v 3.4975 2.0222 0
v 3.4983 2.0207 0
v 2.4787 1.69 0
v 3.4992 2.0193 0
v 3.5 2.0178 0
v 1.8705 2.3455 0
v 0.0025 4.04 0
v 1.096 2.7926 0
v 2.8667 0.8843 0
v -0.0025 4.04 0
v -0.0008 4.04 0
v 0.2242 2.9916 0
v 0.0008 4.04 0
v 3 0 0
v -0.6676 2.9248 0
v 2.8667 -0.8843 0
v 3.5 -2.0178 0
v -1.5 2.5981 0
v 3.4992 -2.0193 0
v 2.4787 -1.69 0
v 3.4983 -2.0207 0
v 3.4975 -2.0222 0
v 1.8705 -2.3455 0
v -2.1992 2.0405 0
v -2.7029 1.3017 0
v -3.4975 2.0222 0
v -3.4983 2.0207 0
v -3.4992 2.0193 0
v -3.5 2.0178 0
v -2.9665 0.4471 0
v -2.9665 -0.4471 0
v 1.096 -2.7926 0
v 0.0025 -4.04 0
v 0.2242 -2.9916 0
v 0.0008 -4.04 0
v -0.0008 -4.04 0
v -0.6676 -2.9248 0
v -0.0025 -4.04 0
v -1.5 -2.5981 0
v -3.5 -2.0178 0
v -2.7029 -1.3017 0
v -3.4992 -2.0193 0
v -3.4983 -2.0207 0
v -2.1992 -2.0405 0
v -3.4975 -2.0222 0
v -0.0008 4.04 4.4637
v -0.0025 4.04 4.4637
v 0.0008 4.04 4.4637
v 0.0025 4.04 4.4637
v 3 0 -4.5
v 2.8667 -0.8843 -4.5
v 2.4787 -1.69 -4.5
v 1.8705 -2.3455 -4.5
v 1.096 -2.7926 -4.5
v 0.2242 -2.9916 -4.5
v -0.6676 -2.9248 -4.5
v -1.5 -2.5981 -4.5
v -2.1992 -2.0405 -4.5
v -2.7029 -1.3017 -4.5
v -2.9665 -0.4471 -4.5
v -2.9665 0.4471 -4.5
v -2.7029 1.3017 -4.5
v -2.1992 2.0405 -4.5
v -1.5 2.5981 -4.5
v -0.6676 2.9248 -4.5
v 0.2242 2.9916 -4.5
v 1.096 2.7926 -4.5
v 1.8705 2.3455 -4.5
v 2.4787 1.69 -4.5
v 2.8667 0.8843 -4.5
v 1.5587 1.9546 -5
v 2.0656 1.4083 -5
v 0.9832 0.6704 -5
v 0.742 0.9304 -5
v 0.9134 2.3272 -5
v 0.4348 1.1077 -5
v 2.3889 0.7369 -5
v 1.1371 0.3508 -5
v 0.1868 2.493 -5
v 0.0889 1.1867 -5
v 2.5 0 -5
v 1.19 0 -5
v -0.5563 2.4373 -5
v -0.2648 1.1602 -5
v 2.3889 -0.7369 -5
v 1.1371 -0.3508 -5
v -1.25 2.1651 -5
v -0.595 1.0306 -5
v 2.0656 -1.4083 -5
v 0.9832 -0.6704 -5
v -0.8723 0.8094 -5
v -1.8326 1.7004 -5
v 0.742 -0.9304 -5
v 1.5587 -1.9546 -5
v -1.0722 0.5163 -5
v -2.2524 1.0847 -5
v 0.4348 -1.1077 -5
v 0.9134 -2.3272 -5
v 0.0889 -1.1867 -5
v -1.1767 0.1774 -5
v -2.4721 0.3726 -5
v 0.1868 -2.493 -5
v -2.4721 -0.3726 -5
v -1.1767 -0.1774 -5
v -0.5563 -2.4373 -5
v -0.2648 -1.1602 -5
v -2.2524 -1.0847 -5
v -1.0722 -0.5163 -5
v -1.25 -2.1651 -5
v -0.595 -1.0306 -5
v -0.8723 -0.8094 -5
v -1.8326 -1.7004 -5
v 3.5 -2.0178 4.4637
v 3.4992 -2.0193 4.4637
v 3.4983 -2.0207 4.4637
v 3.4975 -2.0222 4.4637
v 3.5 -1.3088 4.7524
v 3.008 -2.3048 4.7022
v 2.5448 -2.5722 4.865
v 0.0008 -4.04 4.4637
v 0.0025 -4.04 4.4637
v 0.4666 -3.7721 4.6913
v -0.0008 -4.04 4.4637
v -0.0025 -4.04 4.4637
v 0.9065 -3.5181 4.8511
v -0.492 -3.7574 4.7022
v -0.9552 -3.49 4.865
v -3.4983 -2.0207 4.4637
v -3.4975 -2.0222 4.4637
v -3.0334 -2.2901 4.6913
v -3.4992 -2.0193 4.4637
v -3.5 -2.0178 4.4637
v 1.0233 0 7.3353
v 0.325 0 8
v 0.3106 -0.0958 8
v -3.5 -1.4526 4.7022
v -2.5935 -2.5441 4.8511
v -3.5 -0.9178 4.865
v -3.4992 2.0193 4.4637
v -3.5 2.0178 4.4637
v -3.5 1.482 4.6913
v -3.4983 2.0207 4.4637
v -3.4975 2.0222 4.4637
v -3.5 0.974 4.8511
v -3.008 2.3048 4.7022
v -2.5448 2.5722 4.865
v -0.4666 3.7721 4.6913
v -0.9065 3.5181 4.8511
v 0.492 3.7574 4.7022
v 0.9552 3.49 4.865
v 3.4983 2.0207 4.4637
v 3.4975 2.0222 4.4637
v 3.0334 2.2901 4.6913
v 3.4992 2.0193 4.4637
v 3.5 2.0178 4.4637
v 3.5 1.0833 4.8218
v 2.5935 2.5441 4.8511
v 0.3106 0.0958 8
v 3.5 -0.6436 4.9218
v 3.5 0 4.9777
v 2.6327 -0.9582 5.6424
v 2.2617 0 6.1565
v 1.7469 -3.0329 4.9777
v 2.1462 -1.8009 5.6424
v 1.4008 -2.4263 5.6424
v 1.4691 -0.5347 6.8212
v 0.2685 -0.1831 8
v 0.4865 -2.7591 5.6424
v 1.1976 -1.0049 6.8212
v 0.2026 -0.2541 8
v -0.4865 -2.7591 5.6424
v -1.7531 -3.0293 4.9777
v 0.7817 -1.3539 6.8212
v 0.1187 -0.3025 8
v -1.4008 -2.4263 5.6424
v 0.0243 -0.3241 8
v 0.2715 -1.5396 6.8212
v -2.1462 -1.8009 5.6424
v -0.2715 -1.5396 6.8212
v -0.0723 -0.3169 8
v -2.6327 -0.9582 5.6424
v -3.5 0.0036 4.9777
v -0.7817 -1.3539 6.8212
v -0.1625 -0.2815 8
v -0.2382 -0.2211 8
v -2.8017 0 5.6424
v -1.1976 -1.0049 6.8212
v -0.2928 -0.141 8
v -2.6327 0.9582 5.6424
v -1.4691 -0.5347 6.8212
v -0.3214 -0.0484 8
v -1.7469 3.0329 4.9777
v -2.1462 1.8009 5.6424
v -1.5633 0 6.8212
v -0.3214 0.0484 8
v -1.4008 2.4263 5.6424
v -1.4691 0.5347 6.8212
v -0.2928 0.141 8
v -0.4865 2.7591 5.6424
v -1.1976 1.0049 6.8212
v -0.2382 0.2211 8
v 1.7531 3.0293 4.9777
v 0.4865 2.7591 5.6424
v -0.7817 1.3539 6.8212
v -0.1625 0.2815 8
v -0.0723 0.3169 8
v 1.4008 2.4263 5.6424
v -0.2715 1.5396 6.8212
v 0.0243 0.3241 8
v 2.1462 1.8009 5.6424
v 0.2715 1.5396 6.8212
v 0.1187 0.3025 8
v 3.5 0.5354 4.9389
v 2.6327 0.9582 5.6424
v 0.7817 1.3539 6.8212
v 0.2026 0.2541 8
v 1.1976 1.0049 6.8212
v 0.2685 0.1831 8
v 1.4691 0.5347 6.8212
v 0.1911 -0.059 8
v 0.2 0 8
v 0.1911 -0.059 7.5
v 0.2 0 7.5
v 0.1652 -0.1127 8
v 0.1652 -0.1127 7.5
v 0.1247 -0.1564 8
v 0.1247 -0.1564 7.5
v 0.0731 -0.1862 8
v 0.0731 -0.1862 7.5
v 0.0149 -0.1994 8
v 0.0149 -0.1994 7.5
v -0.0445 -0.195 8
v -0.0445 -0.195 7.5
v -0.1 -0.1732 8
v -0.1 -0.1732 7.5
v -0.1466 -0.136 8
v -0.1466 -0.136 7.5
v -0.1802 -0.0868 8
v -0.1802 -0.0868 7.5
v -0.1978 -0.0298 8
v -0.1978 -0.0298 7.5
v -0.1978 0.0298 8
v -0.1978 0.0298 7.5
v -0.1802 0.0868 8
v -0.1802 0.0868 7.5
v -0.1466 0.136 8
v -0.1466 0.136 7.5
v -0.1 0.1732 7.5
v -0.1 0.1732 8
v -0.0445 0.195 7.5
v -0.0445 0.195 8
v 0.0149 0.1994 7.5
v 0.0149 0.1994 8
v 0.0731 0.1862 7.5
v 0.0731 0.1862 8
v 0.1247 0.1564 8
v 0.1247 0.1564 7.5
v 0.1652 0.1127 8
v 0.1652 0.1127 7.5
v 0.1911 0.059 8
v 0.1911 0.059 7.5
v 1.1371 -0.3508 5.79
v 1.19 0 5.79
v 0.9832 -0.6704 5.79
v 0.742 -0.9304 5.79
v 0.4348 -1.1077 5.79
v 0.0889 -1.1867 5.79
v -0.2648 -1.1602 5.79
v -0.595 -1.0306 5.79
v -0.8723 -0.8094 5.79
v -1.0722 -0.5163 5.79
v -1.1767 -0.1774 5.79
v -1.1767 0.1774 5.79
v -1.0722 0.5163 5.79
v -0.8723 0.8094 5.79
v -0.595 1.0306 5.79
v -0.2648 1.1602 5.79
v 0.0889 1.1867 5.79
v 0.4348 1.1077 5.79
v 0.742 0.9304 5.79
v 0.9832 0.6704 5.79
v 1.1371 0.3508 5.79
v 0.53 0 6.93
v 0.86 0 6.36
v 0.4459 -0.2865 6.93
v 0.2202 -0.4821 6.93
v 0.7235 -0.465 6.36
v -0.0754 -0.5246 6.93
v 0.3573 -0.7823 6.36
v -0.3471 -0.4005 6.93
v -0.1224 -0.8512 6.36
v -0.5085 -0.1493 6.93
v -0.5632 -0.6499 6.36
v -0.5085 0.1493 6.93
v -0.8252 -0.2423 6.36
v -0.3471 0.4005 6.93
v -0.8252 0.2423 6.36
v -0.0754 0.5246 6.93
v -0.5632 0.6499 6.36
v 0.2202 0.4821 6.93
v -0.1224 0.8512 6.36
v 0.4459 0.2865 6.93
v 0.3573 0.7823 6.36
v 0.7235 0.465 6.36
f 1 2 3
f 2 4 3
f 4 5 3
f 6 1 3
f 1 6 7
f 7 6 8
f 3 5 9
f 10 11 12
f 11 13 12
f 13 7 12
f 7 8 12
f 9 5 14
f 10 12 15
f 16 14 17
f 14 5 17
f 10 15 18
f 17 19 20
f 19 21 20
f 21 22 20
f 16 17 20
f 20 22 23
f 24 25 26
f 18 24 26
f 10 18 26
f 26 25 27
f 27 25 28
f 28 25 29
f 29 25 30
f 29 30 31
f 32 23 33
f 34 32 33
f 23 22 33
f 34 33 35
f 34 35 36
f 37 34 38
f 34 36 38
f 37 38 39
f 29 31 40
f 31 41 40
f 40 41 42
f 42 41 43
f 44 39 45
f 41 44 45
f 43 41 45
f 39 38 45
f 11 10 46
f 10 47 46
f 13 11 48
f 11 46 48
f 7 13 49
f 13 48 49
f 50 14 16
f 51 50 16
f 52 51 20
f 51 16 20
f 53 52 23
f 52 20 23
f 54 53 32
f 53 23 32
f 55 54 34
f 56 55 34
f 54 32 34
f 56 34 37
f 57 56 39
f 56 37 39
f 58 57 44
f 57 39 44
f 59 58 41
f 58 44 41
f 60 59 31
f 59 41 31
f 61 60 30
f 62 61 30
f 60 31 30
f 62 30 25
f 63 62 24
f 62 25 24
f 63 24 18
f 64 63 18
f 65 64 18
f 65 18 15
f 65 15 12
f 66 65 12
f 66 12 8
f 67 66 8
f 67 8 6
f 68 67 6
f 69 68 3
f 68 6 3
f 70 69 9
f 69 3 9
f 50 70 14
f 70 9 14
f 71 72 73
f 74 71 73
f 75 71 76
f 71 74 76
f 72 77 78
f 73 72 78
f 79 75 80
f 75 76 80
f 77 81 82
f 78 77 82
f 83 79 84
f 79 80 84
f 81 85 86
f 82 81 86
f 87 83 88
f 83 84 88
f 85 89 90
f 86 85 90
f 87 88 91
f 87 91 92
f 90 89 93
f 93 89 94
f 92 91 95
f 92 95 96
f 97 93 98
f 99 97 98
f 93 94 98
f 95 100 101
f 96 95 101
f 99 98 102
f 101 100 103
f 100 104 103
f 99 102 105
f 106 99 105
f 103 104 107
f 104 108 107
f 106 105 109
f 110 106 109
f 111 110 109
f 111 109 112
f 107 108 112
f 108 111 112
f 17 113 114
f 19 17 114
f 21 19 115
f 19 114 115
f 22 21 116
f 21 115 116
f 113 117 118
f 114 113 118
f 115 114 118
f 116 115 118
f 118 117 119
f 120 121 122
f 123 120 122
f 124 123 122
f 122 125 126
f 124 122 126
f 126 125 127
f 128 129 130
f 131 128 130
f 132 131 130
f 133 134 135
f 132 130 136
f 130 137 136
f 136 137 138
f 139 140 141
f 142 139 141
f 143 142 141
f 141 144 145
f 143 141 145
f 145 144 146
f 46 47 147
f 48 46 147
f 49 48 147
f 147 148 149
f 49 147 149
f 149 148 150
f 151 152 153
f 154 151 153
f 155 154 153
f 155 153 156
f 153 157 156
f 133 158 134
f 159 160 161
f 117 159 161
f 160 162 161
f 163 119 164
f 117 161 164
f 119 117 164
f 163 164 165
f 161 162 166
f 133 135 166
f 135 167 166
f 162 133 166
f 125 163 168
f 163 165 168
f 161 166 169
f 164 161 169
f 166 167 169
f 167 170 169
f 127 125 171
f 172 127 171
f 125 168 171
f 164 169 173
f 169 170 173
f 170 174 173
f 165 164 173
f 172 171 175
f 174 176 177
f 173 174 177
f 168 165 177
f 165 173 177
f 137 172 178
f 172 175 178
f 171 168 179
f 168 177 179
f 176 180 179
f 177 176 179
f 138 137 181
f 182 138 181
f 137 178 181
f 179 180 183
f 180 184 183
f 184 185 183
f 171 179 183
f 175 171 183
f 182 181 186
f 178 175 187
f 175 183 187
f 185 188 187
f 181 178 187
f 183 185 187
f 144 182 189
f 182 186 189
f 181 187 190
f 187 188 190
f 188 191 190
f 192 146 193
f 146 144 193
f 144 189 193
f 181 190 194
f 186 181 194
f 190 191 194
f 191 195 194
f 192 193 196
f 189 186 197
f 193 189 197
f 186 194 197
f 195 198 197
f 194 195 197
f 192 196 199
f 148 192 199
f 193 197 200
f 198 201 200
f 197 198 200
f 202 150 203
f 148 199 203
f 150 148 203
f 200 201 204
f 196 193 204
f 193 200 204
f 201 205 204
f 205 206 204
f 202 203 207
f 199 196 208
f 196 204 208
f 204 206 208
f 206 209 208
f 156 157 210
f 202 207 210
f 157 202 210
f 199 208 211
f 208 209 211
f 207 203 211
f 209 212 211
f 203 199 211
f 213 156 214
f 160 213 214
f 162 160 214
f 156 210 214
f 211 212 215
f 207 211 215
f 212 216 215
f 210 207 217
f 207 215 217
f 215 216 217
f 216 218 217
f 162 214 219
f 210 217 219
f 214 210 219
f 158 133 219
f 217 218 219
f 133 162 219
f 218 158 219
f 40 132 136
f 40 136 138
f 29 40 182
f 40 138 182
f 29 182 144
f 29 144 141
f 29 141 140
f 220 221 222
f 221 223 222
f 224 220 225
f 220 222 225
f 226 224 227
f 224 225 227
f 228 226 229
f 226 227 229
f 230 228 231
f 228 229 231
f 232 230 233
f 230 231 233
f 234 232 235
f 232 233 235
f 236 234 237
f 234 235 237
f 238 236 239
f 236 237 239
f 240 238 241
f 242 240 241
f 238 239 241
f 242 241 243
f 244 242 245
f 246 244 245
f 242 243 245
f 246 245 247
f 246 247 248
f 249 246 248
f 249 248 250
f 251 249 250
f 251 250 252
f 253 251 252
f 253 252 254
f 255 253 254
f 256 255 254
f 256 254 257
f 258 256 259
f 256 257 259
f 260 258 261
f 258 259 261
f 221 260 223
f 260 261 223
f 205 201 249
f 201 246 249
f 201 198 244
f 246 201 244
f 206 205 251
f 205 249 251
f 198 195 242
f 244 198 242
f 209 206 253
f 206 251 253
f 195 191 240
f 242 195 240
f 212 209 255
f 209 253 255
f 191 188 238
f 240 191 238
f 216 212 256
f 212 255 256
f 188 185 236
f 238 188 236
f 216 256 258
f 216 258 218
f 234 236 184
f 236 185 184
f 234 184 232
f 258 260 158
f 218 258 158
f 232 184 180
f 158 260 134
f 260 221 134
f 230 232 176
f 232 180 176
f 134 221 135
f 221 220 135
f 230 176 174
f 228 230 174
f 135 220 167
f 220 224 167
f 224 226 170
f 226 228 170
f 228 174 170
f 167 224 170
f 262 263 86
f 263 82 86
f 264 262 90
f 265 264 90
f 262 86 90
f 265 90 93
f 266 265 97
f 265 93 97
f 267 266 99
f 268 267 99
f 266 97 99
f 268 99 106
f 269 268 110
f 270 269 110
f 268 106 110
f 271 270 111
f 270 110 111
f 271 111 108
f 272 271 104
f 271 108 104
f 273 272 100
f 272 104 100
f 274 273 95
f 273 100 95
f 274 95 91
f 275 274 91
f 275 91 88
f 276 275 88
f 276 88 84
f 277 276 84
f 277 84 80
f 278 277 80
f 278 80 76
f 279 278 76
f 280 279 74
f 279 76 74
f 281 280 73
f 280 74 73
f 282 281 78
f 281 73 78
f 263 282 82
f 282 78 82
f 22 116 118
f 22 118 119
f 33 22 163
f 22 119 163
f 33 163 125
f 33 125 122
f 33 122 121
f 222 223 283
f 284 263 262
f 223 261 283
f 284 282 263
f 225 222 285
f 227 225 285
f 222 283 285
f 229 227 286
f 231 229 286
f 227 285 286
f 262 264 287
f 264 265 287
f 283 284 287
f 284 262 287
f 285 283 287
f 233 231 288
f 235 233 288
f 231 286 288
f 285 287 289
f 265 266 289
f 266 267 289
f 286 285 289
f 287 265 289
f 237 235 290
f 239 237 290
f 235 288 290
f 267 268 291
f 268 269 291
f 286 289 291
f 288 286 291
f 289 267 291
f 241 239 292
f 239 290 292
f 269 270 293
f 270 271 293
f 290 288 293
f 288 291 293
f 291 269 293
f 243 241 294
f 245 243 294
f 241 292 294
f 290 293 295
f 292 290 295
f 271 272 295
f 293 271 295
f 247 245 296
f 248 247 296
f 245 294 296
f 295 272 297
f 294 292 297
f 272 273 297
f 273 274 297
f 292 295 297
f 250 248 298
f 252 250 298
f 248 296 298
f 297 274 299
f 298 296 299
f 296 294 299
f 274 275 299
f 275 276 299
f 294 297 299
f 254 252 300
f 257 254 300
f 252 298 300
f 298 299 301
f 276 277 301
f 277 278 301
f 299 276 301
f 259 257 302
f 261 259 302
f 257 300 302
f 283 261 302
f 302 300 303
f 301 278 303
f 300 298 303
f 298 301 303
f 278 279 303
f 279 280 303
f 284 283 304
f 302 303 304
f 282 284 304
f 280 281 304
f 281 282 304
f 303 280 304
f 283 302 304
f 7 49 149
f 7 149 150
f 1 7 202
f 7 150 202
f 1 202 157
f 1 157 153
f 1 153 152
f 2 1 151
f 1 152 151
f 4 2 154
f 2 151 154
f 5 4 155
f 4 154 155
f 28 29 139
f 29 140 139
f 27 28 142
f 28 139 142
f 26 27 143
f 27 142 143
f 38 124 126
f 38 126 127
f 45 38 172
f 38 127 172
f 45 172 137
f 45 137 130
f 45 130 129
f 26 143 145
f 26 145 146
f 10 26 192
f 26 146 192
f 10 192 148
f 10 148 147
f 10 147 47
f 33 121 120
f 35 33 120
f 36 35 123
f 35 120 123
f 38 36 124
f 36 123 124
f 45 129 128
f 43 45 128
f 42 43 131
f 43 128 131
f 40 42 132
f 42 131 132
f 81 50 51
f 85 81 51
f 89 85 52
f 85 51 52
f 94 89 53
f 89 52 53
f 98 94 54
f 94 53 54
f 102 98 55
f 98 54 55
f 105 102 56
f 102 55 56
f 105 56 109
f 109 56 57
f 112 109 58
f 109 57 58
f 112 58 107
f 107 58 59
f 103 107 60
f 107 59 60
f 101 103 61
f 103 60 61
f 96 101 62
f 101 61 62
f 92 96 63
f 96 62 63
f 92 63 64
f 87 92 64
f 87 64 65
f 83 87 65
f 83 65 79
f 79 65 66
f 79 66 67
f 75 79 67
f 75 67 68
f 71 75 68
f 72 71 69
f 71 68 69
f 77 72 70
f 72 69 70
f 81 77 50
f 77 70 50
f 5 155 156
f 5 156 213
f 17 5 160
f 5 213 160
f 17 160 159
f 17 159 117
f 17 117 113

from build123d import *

# Parameters (mm, degrees)
F2_SIZE  = 0.5
F4_DEPTH = 13.001


with BuildPart() as f1:
    # F0 (on Front) → F1 (revolve)
    with BuildSketch(Plane.XZ):
        Polygon((1.19, 5.79), (1.19, -5), (3, -5), (3, 0), (4.04, 0), (4.04, 4.463661), (0.325, 8), (0.2, 8), (0.2, 7.5), align=None)
    revolve(axis=Axis((0, 0, 0.76721), (0, 0, -1)))

    # F2
    f2_edges = [f1.edges().sort_by_distance(p)[0] for p in [
        (-3, 0, -5),
    ]]
    chamfer(f2_edges, length=F2_SIZE)

    # F3 (on face) → F4 (cut, through all)
    with BuildSketch(Plane.XY.offset(8)):
        Polygon((5.229439, 4.649782), (3.5, 4.649782), (3.5, 4.01771), (5.229439, 3.019218), align=None)
        Polygon((3.5, 2.020726), (3.5, 4.01771), (1.729439, 5.039944), (0, 4.041452), align=None)
        Polygon((6.746156, 2.143541), (5.229439, 3.019218), (5.229439, 1.022234), (5.881436, 0.645803), align=None)
        Polygon((5.229439, 1.022234), (3.5, 2.020726), (3.5, -2.020726), (5.229439, -1.022234), align=None)
        Polygon((0, 6.038436), (1.729439, 5.039944), (2.381436, 5.416375), (1.516717, 6.914113), align=None)
        Polygon((3.5, -4.01771), (3.5, -2.020726), (0, -4.041452), (1.729439, -5.039944), align=None)
        Polygon((-3.5, 2.020726), (0, 4.041452), (-1.729439, 5.039944), (-3.5, 4.01771), align=None)
        Polygon((-1.729439, 5.039944), (0, 6.038436), (-1.41211, 6.853717), (-2.276829, 5.35598), align=None)
        Polygon((5.776829, -0.706198), (5.229439, -1.022234), (5.229439, -3.019218), (6.641548, -2.203936), align=None)
        Polygon((5.229439, -3.019218), (3.5, -4.01771), (3.5, -4.770572), (5.229439, -4.770572), align=None)
        Polygon((-1.729439, -5.039944), (0, -4.041452), (-3.5, -2.020726), (-3.5, -4.01771), align=None)
        Polygon((-3.5, -2.020726), (-3.5, 2.020726), (-5.229439, 1.022234), (-5.229439, -1.022234), align=None)
        Polygon((2.276829, -5.35598), (1.729439, -5.039944), (0, -6.038436), (1.41211, -6.853717), align=None)
        Polygon((0, -6.038436), (-1.729439, -5.039944), (-2.381436, -5.416375), (-1.516717, -6.914113), align=None)
        Polygon((-5.229439, 3.019218), (-3.5, 4.01771), (-3.5, 4.770572), (-5.229439, 4.770572), align=None)
        Polygon((-5.776829, 0.706198), (-5.229439, 1.022234), (-5.229439, 3.019218), (-6.641548, 2.203936), align=None)
        Polygon((-3.5, -4.649782), (-3.5, -4.01771), (-5.229439, -3.019218), (-5.229439, -4.649782), align=None)
        Polygon((-5.229439, -3.019218), (-5.229439, -1.022234), (-5.881436, -0.645803), (-6.746156, -2.143541), align=None)
    extrude(amount=-F4_DEPTH, mode=Mode.SUBTRACT)


solid = f1.part
